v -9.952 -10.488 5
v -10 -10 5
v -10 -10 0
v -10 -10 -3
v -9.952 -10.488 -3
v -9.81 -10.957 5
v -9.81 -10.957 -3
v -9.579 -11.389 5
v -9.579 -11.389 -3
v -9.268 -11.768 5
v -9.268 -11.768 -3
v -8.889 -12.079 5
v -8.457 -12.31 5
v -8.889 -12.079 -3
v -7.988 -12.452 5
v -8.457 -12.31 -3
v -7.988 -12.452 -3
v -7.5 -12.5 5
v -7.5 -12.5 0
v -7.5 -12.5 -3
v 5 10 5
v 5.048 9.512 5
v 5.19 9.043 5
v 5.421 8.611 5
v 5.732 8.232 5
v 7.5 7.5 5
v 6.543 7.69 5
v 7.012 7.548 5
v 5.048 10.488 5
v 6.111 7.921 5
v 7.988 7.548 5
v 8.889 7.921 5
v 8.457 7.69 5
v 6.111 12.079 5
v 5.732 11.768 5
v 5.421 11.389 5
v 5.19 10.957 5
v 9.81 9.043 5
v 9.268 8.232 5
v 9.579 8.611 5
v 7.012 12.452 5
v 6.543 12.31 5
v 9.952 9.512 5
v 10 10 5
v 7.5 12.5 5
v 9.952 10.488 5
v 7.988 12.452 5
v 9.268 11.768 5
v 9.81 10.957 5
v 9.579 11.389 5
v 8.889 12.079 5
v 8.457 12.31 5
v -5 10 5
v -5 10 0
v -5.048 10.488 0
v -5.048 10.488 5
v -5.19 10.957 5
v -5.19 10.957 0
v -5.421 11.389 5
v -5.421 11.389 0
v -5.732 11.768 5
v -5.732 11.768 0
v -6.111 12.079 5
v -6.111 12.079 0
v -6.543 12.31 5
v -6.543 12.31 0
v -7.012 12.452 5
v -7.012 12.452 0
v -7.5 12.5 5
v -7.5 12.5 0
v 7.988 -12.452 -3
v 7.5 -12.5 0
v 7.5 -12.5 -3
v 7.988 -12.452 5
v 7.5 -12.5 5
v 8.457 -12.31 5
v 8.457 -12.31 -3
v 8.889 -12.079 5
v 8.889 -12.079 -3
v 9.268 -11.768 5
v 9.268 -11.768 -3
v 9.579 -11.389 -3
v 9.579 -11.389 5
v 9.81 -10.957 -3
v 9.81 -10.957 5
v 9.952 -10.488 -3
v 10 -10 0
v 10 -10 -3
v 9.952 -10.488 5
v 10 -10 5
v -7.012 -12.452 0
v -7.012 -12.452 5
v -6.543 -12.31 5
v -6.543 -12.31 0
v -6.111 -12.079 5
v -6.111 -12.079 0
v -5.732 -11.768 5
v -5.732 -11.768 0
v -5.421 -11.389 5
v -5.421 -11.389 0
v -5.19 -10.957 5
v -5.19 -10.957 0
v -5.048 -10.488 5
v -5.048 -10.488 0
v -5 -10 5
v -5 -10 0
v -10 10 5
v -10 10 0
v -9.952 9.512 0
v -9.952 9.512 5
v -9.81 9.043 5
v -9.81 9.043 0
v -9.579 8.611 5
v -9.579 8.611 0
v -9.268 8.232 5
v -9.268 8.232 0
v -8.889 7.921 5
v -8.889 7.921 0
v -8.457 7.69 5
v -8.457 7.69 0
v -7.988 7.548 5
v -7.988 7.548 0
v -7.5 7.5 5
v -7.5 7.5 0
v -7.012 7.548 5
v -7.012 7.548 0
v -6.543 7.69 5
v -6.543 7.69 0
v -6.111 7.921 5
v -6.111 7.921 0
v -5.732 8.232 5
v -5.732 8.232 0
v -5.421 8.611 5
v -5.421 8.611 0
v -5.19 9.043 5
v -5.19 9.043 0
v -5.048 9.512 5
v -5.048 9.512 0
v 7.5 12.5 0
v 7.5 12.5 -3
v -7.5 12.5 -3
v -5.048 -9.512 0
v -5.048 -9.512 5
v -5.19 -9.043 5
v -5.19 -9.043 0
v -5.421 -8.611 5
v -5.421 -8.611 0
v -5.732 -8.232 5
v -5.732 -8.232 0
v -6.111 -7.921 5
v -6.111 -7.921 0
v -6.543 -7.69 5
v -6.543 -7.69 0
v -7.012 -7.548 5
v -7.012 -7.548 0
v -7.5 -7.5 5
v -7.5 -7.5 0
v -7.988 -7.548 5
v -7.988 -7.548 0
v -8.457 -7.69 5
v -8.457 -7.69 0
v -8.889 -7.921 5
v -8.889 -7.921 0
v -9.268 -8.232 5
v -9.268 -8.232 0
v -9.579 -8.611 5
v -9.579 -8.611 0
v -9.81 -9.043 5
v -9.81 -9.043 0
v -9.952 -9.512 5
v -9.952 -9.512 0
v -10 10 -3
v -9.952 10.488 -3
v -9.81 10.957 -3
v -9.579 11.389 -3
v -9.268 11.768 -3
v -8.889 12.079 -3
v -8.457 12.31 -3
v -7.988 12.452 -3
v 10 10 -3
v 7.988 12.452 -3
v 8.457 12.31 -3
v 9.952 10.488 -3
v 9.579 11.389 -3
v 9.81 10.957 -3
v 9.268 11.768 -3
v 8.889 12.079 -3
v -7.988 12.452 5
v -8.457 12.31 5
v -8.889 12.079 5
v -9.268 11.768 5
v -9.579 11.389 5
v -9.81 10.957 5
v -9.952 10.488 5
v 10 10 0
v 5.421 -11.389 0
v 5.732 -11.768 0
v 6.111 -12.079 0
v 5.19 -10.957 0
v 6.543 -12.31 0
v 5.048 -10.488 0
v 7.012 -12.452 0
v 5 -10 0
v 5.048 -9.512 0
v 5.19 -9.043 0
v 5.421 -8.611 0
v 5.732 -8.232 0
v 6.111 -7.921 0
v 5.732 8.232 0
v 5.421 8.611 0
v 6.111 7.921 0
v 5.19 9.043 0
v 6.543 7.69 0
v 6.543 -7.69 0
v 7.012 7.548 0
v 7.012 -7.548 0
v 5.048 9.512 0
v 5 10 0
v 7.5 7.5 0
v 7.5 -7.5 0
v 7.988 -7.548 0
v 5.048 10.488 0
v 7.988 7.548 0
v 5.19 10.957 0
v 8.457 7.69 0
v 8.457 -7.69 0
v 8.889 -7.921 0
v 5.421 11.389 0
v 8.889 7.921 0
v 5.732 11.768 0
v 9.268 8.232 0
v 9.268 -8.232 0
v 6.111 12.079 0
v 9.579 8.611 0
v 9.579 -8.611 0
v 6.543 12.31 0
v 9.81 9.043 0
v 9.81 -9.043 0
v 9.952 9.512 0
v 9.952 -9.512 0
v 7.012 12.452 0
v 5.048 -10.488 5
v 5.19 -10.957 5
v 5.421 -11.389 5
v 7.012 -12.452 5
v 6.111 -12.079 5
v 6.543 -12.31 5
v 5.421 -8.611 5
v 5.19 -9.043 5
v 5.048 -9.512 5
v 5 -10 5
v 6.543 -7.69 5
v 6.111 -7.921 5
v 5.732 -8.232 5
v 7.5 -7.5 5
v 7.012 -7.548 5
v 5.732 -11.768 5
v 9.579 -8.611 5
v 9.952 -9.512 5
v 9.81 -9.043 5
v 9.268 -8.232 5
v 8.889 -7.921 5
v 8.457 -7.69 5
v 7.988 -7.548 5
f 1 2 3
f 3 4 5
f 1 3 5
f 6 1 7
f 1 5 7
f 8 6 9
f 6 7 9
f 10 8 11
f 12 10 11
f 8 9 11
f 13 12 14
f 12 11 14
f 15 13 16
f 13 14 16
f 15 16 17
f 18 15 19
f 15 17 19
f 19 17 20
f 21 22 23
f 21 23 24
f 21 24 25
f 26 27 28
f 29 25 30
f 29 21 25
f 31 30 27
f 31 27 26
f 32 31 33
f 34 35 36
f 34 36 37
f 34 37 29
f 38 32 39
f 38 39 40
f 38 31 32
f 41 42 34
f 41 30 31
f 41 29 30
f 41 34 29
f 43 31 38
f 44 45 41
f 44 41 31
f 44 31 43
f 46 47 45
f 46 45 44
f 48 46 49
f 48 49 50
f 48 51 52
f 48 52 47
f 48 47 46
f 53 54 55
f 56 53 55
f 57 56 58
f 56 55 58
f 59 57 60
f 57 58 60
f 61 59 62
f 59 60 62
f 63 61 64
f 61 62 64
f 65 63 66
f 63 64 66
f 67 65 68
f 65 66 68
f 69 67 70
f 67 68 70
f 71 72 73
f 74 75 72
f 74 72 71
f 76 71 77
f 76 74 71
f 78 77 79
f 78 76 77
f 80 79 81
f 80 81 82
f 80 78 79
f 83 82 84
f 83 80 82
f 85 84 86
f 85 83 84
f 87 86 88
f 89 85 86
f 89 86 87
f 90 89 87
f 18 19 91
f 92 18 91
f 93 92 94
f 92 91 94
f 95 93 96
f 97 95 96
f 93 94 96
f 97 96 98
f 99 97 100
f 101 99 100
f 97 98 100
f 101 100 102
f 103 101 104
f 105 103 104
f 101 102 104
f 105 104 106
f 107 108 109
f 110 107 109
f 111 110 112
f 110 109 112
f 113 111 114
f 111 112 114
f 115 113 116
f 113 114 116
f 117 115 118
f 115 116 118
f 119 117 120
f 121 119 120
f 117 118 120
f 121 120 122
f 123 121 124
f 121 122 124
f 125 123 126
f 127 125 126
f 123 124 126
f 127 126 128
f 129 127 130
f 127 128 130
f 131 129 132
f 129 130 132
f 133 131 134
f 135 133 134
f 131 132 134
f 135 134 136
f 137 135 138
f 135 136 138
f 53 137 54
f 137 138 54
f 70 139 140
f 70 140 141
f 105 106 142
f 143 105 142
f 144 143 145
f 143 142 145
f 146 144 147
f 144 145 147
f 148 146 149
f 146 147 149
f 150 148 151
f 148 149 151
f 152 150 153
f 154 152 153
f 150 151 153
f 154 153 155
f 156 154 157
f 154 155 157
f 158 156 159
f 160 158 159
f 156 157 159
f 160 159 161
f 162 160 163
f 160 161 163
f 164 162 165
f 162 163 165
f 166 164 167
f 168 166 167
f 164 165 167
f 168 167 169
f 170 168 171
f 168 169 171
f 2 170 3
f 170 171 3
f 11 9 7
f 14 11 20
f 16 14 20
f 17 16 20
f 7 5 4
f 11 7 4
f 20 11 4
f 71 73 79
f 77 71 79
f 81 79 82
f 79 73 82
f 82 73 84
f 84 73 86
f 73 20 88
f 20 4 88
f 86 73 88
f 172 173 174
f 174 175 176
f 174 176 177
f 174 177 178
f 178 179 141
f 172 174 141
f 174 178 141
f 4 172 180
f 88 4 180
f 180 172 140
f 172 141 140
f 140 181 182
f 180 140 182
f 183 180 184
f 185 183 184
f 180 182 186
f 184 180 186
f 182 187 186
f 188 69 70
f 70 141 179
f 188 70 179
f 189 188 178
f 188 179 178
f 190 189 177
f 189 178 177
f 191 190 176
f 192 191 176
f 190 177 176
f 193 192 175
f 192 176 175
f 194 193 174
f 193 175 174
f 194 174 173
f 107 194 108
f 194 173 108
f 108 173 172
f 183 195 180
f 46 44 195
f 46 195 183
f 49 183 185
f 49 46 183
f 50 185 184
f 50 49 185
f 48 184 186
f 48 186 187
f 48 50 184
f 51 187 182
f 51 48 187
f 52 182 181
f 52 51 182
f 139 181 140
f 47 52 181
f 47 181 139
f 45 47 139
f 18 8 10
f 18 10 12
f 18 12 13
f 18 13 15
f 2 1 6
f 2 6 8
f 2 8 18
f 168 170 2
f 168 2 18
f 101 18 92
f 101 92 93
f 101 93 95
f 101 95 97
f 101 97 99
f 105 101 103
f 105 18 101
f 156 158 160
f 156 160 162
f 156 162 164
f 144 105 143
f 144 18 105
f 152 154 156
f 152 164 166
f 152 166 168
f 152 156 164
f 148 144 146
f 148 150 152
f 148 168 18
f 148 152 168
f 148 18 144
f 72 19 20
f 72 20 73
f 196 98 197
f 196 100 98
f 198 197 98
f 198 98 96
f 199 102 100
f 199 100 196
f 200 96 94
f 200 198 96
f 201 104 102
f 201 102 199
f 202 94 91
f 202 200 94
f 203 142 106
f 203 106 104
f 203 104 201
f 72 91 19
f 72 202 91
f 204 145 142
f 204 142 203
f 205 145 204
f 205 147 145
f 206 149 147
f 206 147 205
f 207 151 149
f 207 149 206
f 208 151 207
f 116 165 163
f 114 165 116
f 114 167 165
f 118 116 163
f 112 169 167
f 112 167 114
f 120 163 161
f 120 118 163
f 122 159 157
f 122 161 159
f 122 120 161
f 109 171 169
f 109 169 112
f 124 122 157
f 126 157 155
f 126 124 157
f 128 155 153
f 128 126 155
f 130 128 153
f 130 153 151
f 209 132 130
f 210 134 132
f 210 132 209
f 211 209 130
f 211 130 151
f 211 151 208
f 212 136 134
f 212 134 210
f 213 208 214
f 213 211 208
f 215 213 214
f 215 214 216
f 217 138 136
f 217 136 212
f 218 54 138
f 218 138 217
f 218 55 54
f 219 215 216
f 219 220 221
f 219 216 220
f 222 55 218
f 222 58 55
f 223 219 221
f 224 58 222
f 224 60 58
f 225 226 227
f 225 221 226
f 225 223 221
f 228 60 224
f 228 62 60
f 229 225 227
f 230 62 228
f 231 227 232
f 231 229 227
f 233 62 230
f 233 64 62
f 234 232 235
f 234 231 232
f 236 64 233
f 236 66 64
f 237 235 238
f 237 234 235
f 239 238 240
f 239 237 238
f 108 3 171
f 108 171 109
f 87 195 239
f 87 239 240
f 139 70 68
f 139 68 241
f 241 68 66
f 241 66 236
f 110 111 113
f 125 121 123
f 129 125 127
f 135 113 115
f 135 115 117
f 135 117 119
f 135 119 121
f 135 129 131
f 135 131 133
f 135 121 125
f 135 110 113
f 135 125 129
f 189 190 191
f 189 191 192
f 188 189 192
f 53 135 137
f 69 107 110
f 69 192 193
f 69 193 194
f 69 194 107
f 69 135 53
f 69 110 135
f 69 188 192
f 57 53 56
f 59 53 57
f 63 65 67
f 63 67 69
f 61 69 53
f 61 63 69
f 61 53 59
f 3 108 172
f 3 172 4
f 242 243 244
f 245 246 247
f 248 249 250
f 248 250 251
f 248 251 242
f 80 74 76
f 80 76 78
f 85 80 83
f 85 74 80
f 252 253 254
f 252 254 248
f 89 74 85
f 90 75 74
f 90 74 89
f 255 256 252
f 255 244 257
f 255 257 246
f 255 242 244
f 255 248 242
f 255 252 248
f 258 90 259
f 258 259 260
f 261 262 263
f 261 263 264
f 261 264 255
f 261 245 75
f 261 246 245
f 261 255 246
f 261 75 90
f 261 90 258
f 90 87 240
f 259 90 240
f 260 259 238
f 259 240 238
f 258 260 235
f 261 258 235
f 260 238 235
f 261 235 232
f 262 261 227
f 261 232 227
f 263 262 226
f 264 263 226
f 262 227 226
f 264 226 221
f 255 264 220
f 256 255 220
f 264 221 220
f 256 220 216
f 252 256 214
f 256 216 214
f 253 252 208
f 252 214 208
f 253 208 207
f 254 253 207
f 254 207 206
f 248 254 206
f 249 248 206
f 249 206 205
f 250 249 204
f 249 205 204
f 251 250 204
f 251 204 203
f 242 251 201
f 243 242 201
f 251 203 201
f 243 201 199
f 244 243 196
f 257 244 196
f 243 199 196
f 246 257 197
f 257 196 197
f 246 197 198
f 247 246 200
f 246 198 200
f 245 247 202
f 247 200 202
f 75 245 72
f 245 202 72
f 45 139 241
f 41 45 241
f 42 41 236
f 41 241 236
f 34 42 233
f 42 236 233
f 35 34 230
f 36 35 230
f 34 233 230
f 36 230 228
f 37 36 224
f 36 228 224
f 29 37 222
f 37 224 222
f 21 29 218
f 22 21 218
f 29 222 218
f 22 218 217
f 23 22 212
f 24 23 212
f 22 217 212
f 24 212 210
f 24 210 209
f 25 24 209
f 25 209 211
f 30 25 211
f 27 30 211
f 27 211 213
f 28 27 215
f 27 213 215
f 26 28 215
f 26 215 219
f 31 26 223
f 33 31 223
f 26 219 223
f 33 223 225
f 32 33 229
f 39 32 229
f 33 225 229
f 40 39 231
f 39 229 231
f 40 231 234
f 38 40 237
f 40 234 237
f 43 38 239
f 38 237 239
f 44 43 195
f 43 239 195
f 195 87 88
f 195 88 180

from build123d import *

# Parameters (mm, degrees)
F1_DEPTH = 3
F2_DEPTH = 5


with BuildPart() as f1:
    # F0 (on Top) → F1 (new body)
    with BuildSketch(Plane.XY):
        with BuildLine():
            ThreePointArc((-7.5, 12.5), (-5.732233, 11.767767), (-5, 10))
            ThreePointArc((-5, 10), (-7.5, 7.5), (-10, 10))
            Line((-10, 10), (-10, -10))
            ThreePointArc((-10, -10), (-7.5, -7.5), (-5, -10))
            ThreePointArc((-5, -10), (-5.732233, -11.767767), (-7.5, -12.5))
            Line((-7.5, -12.5), (7.5, -12.5))
            ThreePointArc((7.5, -12.5), (5.732233, -8.232233), (10, -10))
            Line((10, -10), (10, 10))
            ThreePointArc((10, 10), (5.732233, 8.232233), (7.5, 12.5))
            Line((7.5, 12.5), (-7.5, 12.5))
        make_face()
        with BuildLine():
            ThreePointArc((7.5, -12.5), (9.267767, -11.767767), (10, -10))
            ThreePointArc((10, -10), (5.732233, -8.232233), (7.5, -12.5))
        make_face()
        with BuildLine():
            ThreePointArc((-5, -10), (-7.5, -7.5), (-10, -10))
            ThreePointArc((-10, -10), (-9.267767, -11.767767), (-7.5, -12.5))
            ThreePointArc((-7.5, -12.5), (-5.732233, -11.767767), (-5, -10))
        make_face()
        with BuildLine():
            ThreePointArc((-10, 10), (-7.5, 7.5), (-5, 10))
            ThreePointArc((-5, 10), (-5.732233, 11.767767), (-7.5, 12.5))
            ThreePointArc((-7.5, 12.5), (-9.267767, 11.767767), (-10, 10))
        make_face()
        with BuildLine():
            ThreePointArc((10, 10), (9.267767, 11.767767), (7.5, 12.5))
            ThreePointArc((7.5, 12.5), (5.732233, 8.232233), (10, 10))
        make_face()
    extrude(amount=-F1_DEPTH)

    # F0 (on Top) → F2 (join)
    with BuildSketch(Plane.XY):
        with BuildLine():
            ThreePointArc((-5, -10), (-7.5, -7.5), (-10, -10))
            ThreePointArc((-10, -10), (-9.267767, -11.767767), (-7.5, -12.5))
            ThreePointArc((-7.5, -12.5), (-5.732233, -11.767767), (-5, -10))
        make_face()
        with BuildLine():
            ThreePointArc((7.5, -12.5), (9.267767, -11.767767), (10, -10))
            ThreePointArc((10, -10), (5.732233, -8.232233), (7.5, -12.5))
        make_face()
        with BuildLine():
            ThreePointArc((10, 10), (9.267767, 11.767767), (7.5, 12.5))
            ThreePointArc((7.5, 12.5), (5.732233, 8.232233), (10, 10))
        make_face()
        with BuildLine():
            ThreePointArc((-10, 10), (-7.5, 7.5), (-5, 10))
            ThreePointArc((-5, 10), (-5.732233, 11.767767), (-7.5, 12.5))
            ThreePointArc((-7.5, 12.5), (-9.267767, 11.767767), (-10, 10))
        make_face()
    extrude(amount=F2_DEPTH)


solid = f1.part
